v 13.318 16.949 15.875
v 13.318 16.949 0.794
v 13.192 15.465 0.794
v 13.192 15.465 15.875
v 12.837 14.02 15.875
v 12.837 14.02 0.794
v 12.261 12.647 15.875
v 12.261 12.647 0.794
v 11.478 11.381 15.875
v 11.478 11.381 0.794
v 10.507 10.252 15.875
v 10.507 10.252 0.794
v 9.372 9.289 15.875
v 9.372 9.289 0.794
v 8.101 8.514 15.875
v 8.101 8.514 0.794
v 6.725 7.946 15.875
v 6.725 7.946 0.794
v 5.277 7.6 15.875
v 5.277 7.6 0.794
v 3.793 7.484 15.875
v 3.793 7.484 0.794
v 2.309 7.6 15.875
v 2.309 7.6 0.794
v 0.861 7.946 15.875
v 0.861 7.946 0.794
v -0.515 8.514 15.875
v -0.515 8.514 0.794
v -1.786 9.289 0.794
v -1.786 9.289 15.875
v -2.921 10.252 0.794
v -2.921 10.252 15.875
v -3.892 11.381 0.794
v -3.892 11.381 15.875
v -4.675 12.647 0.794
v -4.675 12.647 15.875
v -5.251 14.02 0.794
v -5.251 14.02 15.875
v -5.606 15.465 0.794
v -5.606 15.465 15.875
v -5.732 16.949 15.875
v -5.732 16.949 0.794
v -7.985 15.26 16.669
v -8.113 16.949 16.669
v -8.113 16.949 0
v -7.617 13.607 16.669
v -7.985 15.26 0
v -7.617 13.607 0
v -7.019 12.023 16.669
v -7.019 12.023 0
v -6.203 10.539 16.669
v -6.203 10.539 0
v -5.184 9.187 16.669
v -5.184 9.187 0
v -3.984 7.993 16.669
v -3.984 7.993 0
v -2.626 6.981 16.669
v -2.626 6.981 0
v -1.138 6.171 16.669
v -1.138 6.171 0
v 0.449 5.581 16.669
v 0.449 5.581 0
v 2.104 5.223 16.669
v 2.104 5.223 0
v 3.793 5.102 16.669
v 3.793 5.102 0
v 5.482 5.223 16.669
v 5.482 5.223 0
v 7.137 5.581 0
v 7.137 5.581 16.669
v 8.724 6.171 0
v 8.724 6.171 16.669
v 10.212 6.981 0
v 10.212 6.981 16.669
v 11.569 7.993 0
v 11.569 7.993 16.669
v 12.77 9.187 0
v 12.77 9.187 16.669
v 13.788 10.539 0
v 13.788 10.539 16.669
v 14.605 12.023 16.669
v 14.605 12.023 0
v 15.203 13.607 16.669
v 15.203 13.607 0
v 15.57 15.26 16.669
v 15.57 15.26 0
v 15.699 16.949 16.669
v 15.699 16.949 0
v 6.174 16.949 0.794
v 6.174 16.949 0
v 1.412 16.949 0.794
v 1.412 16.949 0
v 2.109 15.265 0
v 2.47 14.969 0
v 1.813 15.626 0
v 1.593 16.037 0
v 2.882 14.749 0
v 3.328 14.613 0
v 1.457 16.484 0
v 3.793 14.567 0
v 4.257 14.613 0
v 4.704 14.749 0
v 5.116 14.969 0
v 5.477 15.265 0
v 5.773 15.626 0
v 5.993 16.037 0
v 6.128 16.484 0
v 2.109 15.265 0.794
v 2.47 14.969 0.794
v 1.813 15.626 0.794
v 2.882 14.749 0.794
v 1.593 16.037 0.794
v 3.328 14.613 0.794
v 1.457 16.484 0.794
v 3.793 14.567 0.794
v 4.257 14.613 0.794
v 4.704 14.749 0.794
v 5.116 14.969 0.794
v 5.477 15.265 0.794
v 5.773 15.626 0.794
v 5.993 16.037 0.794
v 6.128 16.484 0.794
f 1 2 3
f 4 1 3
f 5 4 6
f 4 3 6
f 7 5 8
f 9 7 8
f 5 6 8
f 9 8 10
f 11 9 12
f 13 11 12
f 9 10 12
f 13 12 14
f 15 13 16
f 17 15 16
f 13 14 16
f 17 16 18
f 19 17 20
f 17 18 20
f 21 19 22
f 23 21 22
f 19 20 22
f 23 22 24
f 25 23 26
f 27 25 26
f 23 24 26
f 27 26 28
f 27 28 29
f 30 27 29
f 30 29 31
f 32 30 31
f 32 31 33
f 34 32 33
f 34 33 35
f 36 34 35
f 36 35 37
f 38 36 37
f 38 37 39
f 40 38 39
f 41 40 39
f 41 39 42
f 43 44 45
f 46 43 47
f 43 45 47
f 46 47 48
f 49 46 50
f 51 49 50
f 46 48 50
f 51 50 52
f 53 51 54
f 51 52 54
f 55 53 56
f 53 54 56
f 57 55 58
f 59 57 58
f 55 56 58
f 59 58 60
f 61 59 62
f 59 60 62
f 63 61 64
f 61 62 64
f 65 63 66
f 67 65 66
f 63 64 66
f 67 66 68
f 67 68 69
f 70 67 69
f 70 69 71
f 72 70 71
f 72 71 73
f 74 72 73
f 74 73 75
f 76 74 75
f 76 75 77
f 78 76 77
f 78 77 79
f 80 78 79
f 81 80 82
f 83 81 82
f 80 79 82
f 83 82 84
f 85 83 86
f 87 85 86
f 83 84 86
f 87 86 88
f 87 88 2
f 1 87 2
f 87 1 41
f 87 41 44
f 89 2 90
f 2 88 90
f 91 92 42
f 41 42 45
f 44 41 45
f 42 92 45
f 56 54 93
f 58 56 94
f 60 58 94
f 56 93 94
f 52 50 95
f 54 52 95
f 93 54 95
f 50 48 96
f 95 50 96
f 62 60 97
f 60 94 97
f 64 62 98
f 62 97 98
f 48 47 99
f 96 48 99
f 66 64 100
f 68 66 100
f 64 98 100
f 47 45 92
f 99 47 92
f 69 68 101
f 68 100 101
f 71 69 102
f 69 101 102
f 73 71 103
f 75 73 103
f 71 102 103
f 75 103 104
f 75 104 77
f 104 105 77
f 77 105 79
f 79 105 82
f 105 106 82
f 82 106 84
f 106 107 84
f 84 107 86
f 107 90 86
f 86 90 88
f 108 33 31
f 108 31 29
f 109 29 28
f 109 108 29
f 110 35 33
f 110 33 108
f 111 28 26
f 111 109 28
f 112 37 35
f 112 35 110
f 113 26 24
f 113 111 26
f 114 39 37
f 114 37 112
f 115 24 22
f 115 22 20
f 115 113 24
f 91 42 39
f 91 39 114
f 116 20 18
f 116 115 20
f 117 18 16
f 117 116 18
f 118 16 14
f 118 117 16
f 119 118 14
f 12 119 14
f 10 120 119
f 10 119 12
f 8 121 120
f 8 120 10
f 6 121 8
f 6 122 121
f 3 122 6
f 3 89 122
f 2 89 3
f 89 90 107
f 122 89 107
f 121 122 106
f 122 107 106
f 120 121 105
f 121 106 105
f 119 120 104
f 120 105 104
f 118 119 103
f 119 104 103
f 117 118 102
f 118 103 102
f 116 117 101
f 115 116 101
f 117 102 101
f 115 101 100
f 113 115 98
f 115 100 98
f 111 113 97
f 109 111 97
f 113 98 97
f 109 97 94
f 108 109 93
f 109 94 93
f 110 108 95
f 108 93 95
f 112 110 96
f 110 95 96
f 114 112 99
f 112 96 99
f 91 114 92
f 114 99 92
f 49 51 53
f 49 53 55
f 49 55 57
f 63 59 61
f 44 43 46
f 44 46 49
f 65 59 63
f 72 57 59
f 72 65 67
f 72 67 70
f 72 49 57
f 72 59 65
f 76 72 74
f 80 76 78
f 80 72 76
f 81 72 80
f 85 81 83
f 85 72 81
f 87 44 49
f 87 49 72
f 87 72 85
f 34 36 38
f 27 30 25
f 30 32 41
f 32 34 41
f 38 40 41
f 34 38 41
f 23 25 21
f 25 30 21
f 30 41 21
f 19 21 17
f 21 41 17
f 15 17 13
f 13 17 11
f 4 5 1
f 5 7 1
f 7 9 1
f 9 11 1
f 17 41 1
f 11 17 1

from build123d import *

# Parameters (mm, degrees)
F1_DEPTH = 15.875
F2_DEPTH = 0.79375
F4_DEPTH = 0.79375
F6_DEPTH = 5.08


# Not quite as in the source:
# - a length typed as a fraction of an inch, garbled in the dataset ("3 / 203.2 mm" for 3/8 in), is restored


with BuildPart() as f1:
    # F0 (on Top) → F1 (new body)
    with BuildSketch(Plane.XY):
        with BuildLine():
            Line((-5.732164003, 16.9486273388), (-8.1134518534, 16.9486273388))
            ThreePointArc((-8.1134518534, 16.9486273388), (3.7927981466, 5.1022697967), (15.6990481466, 16.9486273388))
            Line((15.6990481466, 16.9486273388), (13.3177602962, 16.9486273388))
            ThreePointArc((13.3177602962, 16.9486273388), (3.7927981466, 7.4835197967), (-5.732164003, 16.9486273388))
        make_face()
    extrude(amount=F1_DEPTH)

    # F0 (on Top) → F2 (join)
    with BuildSketch(Plane.XY):
        with BuildLine():
            Line((13.3177602962, 16.9486273388), (-5.732164003, 16.9486273388))
            ThreePointArc((-5.732164003, 16.9486273388), (3.7927981466, 7.4835197967), (13.3177602962, 16.9486273388))
        make_face()
    extrude(amount=F2_DEPTH)

    # F3 (on face) → F4 (join)
    with BuildSketch(Plane.XY.offset(15.875)):
        with BuildLine():
            Line((13.3177602962, 16.9486273388), (-5.732164003, 16.9486273388))
            ThreePointArc((-5.732164003, 16.9486273388), (3.7927981466, 7.4236651892), (13.3177602962, 16.9486273388))
        make_face()
        with BuildLine():
            ThreePointArc((13.3177602962, 16.9486273388), (3.7927981466, 7.4236651892), (-5.732164003, 16.9486273388))
            Line((-5.732164003, 16.9486273388), (-8.1134518534, 16.9486273388))
            ThreePointArc((-8.1134518534, 16.9486273388), (3.7927981466, 5.1022697967), (15.6990481466, 16.9486273388))
            Line((15.6990481466, 16.9486273388), (13.3177602962, 16.9486273388))
        make_face()
    extrude(amount=F4_DEPTH)

    # F5 (on face) → F6 (cut)
    with BuildSketch(Plane(origin=(0, 0, 0), x_dir=(1, 0, 0), z_dir=(0, 0, -1))):
        with BuildLine():
            ThreePointArc((6.1740481466, -16.9486273388), (3.7927981466, -14.5673773388), (1.4115481466, -16.9486273388))
            Line((1.4115481466, -16.9486273388), (6.1740481466, -16.9486273388))
        make_face()
    extrude(amount=-F6_DEPTH, mode=Mode.SUBTRACT)


solid = f1.part
